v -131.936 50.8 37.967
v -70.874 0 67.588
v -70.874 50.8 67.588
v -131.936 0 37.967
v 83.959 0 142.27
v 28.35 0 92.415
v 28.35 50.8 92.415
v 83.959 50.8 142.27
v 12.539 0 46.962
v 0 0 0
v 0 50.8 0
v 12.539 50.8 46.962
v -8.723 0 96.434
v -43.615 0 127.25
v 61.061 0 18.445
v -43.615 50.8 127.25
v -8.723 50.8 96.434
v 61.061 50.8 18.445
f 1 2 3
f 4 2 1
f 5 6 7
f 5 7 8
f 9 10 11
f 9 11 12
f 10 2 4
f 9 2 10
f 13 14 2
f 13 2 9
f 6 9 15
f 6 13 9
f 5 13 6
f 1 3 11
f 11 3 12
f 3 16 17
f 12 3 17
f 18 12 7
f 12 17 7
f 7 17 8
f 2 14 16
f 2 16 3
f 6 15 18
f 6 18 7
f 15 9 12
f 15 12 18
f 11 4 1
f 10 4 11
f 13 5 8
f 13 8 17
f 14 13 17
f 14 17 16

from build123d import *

# Parameters (mm, degrees)
F1_DEPTH = 50.8


with BuildPart() as f1:
    # F0 (on Front) → F1 (new body)
    with BuildSketch(Plane.XZ):
        Polygon((-131.935537, 37.967242), (0, 0), (12.539328, 46.962254), (61.061069, 18.444592), (28.349791, 92.415459), (83.958983, 142.270118), (-8.723013, 96.433535), (-43.615054, 127.250195), (-70.87446, 67.588188), align=None)
    extrude(amount=-F1_DEPTH)


solid = f1.part
